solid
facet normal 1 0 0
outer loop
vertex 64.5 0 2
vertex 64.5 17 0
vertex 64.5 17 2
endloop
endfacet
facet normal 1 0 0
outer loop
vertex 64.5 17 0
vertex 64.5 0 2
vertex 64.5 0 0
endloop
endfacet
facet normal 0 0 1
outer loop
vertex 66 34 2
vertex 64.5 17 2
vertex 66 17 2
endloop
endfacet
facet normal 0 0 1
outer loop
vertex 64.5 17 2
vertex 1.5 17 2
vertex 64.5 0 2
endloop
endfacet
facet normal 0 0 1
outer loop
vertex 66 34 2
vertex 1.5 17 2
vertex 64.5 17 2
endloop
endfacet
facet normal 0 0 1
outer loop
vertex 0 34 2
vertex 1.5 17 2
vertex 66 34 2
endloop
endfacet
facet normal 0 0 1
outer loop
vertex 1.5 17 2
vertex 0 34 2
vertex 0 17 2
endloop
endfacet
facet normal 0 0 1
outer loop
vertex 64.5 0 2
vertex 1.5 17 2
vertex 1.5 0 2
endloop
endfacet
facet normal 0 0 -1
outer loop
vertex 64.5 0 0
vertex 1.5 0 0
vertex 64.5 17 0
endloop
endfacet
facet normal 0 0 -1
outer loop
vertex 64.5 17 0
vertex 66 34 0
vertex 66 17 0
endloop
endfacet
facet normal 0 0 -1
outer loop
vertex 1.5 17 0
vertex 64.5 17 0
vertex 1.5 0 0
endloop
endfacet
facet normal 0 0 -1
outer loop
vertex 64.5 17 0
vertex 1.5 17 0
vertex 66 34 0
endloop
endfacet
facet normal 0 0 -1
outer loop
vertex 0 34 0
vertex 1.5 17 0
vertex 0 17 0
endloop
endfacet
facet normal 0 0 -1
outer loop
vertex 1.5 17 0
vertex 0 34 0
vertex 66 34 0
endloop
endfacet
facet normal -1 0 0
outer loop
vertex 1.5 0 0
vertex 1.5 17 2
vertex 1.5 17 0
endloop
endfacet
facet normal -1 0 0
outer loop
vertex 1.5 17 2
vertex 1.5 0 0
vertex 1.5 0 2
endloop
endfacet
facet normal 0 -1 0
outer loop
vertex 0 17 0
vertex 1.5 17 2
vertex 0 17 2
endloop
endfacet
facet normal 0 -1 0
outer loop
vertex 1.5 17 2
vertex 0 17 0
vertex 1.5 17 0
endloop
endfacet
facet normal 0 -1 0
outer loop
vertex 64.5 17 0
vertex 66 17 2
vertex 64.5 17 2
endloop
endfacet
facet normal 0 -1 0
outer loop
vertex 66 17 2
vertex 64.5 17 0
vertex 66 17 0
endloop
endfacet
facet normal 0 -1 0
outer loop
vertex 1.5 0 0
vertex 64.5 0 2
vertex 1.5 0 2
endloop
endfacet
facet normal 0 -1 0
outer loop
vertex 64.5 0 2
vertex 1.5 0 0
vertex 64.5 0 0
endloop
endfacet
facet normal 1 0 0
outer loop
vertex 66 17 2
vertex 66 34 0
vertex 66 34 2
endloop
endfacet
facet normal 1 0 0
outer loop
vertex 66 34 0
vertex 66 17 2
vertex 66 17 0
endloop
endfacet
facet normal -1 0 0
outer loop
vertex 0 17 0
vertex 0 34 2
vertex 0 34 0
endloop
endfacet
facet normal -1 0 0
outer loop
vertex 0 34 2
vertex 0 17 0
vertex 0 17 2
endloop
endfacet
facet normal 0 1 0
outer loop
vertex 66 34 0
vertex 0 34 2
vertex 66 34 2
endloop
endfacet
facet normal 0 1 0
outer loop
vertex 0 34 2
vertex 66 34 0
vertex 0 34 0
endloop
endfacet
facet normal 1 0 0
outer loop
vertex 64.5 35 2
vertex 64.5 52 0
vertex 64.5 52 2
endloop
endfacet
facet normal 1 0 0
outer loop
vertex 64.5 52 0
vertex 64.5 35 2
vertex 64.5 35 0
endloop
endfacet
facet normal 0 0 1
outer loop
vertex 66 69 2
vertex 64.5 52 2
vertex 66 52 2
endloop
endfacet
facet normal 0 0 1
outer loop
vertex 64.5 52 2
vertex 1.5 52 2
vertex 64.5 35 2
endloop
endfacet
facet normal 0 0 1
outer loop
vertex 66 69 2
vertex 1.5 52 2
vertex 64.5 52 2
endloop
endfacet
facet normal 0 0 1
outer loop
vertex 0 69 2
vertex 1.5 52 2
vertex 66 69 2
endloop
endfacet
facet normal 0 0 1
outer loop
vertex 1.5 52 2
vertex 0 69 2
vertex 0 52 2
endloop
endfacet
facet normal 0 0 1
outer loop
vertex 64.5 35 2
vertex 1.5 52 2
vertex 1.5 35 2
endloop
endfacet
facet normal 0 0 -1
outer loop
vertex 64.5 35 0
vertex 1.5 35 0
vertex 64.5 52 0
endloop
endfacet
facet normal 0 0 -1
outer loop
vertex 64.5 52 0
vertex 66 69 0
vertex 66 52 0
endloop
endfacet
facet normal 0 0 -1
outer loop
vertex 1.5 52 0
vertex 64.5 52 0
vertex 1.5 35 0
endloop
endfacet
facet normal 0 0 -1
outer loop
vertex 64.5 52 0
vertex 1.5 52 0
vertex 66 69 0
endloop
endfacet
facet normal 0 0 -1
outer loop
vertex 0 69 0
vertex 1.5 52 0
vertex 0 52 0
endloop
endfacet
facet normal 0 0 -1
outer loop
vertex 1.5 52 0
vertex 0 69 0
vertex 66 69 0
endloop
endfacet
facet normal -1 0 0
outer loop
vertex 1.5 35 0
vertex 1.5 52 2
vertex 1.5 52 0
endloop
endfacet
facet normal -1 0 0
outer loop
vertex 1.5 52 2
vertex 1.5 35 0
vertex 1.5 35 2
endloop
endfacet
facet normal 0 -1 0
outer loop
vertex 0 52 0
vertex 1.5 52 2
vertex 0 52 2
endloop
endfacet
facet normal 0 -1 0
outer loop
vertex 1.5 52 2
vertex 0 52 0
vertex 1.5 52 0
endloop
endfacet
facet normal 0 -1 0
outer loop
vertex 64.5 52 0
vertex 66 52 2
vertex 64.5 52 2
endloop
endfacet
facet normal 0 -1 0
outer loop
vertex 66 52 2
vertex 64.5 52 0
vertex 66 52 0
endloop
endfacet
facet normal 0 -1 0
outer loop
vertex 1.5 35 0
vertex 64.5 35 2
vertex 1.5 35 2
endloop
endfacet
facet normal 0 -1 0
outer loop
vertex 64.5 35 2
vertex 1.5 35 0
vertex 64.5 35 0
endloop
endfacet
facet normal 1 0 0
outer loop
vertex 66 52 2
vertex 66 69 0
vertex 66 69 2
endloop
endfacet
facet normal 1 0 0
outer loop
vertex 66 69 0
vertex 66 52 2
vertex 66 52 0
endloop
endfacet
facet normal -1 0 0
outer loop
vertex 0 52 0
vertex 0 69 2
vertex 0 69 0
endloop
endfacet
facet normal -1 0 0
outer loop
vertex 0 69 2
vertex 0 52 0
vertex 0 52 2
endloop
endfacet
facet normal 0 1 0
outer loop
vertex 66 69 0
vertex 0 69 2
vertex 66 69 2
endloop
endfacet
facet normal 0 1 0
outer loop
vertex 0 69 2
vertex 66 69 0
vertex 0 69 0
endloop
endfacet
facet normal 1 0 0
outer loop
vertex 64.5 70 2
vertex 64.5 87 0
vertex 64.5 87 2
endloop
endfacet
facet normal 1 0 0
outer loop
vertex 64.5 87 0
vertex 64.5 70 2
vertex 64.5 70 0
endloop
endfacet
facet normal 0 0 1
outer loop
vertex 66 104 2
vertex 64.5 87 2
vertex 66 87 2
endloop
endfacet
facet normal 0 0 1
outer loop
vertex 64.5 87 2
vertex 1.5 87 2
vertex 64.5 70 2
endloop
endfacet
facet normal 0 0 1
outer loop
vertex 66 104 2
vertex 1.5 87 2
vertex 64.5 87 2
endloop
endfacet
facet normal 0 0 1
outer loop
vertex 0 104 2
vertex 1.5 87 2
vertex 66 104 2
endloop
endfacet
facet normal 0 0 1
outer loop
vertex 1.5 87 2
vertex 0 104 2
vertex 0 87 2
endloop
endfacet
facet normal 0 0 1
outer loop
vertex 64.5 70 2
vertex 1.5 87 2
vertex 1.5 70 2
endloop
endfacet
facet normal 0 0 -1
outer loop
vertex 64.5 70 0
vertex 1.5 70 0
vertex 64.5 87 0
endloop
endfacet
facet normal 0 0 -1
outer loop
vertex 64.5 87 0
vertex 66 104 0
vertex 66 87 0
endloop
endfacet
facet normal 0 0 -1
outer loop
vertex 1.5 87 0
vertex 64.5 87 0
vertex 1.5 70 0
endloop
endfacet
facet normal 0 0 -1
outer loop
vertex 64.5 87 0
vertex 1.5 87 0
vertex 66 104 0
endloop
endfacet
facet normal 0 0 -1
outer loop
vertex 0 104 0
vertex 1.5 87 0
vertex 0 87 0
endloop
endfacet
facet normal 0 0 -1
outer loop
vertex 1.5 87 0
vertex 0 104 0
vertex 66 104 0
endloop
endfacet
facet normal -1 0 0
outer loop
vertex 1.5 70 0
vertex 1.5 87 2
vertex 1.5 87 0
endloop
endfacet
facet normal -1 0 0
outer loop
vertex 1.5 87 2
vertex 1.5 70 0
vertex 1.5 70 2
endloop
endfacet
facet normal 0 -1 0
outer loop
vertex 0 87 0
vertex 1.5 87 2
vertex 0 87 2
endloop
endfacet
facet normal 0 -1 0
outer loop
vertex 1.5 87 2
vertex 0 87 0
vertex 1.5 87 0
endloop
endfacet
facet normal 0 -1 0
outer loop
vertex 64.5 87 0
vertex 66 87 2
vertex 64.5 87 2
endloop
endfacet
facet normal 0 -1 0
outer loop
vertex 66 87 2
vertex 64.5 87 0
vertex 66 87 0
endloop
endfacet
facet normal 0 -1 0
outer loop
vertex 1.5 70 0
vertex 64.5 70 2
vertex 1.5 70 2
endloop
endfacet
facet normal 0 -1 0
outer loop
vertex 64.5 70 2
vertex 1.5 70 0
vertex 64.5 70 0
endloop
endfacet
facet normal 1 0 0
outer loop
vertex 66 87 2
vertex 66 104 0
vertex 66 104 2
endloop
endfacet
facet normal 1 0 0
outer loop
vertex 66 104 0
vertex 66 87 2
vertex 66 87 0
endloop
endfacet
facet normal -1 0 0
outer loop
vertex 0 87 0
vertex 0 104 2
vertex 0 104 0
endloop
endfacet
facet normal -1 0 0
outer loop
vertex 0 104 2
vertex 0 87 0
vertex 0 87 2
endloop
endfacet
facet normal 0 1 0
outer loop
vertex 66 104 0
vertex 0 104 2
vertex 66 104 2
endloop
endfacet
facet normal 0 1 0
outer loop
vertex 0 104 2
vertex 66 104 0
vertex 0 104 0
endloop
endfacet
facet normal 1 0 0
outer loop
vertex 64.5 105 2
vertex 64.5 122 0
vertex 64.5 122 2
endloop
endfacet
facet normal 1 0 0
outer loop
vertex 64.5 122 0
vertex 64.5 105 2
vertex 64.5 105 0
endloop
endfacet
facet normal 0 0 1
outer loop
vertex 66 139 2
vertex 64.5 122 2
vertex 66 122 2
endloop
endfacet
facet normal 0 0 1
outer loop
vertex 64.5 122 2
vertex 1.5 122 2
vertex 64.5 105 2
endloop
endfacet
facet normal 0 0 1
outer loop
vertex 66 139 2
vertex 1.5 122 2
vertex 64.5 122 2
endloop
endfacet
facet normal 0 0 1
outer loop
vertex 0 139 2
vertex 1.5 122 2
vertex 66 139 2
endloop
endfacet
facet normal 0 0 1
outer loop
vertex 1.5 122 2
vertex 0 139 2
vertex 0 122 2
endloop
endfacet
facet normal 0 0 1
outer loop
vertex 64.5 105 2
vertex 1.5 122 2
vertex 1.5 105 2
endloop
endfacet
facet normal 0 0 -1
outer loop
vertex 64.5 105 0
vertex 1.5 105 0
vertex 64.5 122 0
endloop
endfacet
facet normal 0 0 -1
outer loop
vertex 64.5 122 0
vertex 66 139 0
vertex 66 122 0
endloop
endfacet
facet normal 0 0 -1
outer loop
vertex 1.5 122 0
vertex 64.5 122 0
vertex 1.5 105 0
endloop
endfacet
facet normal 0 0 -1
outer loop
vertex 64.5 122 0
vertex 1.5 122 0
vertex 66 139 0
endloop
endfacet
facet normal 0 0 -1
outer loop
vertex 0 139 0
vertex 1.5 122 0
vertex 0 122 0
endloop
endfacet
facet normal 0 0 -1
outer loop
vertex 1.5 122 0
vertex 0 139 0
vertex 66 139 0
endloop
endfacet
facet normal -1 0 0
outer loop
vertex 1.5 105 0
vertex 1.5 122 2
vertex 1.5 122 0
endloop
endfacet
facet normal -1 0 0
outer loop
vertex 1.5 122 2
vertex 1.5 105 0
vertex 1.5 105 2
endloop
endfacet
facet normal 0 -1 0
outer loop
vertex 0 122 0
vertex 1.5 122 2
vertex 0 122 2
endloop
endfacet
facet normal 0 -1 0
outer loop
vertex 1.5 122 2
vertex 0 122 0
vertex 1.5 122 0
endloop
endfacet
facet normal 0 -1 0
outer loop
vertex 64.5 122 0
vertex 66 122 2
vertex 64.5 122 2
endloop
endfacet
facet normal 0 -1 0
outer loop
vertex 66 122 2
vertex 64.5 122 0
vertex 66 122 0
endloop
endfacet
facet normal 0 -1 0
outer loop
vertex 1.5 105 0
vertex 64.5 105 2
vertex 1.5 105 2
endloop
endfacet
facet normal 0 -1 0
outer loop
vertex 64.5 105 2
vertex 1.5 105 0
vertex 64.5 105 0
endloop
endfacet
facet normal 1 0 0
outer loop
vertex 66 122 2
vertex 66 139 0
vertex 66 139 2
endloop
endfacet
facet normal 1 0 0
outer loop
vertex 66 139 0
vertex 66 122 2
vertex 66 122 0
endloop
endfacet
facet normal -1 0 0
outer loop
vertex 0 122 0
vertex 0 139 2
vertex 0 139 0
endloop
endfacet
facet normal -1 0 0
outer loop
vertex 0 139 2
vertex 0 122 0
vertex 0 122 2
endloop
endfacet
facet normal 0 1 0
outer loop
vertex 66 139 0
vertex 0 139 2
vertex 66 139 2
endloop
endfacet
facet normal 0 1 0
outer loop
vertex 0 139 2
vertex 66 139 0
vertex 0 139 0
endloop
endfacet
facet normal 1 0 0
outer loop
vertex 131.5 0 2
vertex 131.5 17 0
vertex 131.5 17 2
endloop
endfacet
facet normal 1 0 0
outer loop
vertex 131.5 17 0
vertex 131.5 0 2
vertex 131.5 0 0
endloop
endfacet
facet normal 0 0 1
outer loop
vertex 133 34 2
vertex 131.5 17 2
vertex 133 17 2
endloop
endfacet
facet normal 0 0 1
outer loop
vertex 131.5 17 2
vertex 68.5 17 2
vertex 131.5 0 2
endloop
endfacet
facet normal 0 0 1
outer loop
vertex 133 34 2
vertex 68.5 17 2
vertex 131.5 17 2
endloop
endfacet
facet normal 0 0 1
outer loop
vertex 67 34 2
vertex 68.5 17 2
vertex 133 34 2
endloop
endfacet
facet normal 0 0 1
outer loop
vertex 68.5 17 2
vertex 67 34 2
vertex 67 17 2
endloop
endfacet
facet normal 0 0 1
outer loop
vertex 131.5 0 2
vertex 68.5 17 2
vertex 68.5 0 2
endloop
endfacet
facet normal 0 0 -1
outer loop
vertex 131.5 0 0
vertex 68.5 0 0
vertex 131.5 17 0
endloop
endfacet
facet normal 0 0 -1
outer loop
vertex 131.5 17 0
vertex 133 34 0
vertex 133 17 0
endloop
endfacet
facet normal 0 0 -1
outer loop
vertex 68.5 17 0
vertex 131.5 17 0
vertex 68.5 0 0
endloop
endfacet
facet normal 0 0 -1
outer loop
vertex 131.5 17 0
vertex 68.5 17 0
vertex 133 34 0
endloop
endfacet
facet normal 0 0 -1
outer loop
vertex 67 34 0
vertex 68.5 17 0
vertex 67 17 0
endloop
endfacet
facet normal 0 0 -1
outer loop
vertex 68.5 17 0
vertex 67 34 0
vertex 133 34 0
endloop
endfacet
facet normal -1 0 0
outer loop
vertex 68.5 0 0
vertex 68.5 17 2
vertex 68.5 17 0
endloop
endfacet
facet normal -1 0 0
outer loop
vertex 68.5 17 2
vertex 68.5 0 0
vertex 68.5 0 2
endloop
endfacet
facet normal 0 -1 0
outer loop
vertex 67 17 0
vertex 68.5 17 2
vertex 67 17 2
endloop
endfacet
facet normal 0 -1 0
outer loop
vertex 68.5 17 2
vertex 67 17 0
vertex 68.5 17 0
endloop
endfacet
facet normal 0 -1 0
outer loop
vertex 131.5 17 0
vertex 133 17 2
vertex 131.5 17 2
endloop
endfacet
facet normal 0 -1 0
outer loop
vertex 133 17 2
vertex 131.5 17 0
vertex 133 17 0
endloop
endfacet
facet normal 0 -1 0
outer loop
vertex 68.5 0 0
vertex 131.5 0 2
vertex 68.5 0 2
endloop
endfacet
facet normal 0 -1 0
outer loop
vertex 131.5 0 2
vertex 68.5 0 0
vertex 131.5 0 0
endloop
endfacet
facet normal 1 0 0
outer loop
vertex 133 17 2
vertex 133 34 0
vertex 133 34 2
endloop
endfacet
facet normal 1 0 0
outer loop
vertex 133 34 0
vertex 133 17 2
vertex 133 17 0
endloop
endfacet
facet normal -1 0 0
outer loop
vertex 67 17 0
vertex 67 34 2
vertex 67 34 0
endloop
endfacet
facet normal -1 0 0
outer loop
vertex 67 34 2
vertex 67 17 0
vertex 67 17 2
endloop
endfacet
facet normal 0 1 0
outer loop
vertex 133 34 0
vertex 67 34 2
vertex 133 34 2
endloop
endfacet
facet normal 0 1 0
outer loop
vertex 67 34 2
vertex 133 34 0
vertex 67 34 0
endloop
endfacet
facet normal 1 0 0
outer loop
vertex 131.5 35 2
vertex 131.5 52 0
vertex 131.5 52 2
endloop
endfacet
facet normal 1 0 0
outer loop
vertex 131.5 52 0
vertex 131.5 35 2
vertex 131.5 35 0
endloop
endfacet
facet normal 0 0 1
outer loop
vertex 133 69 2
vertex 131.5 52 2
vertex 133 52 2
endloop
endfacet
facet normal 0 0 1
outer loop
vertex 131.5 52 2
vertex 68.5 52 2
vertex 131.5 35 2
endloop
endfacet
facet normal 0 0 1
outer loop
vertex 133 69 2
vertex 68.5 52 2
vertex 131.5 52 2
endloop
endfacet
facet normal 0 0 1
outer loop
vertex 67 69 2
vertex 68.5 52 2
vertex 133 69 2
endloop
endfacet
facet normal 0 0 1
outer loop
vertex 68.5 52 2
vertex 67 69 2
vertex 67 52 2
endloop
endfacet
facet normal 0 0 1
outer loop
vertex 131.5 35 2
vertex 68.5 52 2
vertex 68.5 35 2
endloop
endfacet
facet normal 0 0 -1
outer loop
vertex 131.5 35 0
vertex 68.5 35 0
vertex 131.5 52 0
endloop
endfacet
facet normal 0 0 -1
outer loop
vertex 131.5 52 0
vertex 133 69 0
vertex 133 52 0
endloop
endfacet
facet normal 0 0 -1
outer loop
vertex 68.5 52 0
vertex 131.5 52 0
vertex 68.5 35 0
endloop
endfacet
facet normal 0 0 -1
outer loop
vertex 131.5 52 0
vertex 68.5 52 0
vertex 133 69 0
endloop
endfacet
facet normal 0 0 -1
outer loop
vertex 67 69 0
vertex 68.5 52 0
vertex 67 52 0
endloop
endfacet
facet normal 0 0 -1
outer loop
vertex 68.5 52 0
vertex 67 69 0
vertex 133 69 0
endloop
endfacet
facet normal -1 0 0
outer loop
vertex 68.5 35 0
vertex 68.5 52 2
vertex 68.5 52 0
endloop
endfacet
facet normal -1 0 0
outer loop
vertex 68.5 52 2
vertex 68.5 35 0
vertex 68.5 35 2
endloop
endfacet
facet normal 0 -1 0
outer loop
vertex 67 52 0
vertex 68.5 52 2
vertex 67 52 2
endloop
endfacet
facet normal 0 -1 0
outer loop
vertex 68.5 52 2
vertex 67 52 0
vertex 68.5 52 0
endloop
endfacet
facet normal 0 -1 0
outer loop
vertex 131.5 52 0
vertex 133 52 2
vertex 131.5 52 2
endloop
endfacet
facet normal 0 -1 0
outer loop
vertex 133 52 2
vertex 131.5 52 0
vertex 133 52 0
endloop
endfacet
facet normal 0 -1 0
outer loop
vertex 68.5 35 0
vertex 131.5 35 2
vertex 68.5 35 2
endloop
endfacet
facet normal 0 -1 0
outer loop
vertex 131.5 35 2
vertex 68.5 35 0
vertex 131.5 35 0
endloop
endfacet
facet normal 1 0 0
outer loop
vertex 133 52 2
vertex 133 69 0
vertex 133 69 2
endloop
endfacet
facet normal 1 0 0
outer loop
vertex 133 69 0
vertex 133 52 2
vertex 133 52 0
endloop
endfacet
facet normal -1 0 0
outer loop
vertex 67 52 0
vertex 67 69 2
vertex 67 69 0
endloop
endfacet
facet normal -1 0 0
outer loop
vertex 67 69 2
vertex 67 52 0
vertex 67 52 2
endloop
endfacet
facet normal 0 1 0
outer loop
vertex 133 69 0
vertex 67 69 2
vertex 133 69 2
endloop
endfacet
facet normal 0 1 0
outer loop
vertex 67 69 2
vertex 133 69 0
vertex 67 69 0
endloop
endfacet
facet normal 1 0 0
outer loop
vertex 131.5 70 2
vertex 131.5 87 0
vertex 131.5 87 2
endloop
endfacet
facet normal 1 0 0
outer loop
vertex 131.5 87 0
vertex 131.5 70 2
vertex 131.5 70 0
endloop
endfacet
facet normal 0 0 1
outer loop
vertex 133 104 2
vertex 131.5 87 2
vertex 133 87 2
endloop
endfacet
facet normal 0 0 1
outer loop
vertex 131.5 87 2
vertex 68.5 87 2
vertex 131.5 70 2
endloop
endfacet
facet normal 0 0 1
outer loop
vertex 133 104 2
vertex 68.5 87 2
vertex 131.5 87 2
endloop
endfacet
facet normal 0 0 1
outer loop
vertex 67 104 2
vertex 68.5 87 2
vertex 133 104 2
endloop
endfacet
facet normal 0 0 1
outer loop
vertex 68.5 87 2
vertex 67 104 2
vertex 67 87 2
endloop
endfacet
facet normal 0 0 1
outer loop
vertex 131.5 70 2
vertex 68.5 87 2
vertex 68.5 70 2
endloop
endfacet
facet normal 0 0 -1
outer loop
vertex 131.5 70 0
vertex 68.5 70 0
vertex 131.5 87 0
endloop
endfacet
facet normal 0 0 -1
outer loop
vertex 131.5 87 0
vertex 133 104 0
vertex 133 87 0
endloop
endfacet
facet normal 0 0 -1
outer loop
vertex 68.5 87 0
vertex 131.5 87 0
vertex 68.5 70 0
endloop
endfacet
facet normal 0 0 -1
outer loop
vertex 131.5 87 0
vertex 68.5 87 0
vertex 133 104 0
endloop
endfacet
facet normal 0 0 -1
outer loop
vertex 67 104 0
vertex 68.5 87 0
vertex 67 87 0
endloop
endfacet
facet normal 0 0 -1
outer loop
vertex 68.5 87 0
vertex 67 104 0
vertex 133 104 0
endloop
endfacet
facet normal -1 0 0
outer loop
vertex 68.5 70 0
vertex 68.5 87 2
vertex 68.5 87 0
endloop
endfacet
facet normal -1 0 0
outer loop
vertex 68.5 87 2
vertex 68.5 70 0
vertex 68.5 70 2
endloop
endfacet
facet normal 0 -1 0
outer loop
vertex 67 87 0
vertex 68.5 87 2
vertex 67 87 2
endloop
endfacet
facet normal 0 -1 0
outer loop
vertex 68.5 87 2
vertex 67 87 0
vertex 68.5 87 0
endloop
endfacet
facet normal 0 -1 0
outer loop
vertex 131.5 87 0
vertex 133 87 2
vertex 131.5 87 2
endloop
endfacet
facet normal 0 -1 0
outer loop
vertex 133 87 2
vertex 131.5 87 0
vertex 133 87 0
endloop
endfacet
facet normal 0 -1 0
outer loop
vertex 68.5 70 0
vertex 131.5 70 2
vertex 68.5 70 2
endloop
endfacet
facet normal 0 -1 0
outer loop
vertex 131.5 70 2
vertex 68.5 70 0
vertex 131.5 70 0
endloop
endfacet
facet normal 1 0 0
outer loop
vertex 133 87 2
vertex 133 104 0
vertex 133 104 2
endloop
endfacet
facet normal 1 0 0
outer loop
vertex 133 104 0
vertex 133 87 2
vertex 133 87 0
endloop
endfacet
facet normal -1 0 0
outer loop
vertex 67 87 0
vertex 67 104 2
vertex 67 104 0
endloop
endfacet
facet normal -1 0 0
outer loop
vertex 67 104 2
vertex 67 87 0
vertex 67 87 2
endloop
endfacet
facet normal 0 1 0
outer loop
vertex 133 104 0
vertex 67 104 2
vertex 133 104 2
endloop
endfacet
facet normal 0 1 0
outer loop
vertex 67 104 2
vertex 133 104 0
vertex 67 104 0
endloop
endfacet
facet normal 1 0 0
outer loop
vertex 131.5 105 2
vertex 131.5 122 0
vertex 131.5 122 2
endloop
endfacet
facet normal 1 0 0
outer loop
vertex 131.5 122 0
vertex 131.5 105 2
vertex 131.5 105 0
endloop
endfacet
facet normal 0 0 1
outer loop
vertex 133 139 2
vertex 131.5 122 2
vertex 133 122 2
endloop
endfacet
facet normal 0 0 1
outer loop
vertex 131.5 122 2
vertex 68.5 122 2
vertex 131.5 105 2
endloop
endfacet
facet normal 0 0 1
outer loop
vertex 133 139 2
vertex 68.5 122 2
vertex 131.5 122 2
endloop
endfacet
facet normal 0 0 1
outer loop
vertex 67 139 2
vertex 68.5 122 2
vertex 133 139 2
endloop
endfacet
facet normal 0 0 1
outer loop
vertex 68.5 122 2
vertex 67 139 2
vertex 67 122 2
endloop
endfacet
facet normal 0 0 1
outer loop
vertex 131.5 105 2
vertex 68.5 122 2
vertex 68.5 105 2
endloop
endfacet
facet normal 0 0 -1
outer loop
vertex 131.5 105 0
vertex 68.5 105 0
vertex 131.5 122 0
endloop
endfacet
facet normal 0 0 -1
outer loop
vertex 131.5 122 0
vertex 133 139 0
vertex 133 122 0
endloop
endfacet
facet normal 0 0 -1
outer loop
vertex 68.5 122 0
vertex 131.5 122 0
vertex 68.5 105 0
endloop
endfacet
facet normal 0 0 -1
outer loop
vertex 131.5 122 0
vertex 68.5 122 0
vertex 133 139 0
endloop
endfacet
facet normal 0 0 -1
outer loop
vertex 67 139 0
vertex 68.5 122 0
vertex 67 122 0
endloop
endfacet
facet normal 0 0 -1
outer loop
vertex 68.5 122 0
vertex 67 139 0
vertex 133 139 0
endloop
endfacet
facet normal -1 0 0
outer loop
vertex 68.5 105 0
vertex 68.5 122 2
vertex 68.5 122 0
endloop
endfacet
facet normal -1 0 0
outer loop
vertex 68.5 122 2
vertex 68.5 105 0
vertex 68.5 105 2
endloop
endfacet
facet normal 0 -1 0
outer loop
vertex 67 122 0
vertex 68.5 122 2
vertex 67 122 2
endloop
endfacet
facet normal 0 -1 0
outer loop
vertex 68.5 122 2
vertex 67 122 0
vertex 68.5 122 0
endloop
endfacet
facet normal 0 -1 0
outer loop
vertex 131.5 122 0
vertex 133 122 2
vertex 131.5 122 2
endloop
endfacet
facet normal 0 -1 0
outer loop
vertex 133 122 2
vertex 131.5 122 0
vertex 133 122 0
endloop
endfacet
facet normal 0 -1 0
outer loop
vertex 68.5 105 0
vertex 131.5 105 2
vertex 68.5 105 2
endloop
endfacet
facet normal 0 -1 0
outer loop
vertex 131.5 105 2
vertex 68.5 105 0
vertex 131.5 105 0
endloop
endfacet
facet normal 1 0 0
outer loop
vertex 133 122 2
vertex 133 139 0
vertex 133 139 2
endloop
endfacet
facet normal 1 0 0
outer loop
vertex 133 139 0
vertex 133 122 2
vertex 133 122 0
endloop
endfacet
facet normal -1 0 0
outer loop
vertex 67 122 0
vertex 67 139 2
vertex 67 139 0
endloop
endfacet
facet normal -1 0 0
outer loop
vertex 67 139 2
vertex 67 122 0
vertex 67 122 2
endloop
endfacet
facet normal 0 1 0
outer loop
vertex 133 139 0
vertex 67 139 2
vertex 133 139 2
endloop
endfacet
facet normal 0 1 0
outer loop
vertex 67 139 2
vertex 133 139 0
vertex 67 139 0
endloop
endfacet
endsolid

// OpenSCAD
// Copyright 2018 Marcos Del Sol Vives
// SPDX-License-Identifier: ISC

widewidth = 66;
wideheight = 17;

thinwidth = 63;
thinheight = 17;

thickness = 2;

count_x = 2;
count_y = 4;

margin = 1;

for (x = [0 : count_x - 1]) {
	for (y = [0 : count_y - 1]) {
		translate([x * (widewidth + margin), y * (wideheight + thinheight + margin), 0]) {
			translate([(widewidth - thinwidth) / 2, 0, 0])
				cube([thinwidth, thinheight, thickness]);

			translate([0, thinheight, 0])
				cube([widewidth, wideheight, thickness]);
		}
	}
}
